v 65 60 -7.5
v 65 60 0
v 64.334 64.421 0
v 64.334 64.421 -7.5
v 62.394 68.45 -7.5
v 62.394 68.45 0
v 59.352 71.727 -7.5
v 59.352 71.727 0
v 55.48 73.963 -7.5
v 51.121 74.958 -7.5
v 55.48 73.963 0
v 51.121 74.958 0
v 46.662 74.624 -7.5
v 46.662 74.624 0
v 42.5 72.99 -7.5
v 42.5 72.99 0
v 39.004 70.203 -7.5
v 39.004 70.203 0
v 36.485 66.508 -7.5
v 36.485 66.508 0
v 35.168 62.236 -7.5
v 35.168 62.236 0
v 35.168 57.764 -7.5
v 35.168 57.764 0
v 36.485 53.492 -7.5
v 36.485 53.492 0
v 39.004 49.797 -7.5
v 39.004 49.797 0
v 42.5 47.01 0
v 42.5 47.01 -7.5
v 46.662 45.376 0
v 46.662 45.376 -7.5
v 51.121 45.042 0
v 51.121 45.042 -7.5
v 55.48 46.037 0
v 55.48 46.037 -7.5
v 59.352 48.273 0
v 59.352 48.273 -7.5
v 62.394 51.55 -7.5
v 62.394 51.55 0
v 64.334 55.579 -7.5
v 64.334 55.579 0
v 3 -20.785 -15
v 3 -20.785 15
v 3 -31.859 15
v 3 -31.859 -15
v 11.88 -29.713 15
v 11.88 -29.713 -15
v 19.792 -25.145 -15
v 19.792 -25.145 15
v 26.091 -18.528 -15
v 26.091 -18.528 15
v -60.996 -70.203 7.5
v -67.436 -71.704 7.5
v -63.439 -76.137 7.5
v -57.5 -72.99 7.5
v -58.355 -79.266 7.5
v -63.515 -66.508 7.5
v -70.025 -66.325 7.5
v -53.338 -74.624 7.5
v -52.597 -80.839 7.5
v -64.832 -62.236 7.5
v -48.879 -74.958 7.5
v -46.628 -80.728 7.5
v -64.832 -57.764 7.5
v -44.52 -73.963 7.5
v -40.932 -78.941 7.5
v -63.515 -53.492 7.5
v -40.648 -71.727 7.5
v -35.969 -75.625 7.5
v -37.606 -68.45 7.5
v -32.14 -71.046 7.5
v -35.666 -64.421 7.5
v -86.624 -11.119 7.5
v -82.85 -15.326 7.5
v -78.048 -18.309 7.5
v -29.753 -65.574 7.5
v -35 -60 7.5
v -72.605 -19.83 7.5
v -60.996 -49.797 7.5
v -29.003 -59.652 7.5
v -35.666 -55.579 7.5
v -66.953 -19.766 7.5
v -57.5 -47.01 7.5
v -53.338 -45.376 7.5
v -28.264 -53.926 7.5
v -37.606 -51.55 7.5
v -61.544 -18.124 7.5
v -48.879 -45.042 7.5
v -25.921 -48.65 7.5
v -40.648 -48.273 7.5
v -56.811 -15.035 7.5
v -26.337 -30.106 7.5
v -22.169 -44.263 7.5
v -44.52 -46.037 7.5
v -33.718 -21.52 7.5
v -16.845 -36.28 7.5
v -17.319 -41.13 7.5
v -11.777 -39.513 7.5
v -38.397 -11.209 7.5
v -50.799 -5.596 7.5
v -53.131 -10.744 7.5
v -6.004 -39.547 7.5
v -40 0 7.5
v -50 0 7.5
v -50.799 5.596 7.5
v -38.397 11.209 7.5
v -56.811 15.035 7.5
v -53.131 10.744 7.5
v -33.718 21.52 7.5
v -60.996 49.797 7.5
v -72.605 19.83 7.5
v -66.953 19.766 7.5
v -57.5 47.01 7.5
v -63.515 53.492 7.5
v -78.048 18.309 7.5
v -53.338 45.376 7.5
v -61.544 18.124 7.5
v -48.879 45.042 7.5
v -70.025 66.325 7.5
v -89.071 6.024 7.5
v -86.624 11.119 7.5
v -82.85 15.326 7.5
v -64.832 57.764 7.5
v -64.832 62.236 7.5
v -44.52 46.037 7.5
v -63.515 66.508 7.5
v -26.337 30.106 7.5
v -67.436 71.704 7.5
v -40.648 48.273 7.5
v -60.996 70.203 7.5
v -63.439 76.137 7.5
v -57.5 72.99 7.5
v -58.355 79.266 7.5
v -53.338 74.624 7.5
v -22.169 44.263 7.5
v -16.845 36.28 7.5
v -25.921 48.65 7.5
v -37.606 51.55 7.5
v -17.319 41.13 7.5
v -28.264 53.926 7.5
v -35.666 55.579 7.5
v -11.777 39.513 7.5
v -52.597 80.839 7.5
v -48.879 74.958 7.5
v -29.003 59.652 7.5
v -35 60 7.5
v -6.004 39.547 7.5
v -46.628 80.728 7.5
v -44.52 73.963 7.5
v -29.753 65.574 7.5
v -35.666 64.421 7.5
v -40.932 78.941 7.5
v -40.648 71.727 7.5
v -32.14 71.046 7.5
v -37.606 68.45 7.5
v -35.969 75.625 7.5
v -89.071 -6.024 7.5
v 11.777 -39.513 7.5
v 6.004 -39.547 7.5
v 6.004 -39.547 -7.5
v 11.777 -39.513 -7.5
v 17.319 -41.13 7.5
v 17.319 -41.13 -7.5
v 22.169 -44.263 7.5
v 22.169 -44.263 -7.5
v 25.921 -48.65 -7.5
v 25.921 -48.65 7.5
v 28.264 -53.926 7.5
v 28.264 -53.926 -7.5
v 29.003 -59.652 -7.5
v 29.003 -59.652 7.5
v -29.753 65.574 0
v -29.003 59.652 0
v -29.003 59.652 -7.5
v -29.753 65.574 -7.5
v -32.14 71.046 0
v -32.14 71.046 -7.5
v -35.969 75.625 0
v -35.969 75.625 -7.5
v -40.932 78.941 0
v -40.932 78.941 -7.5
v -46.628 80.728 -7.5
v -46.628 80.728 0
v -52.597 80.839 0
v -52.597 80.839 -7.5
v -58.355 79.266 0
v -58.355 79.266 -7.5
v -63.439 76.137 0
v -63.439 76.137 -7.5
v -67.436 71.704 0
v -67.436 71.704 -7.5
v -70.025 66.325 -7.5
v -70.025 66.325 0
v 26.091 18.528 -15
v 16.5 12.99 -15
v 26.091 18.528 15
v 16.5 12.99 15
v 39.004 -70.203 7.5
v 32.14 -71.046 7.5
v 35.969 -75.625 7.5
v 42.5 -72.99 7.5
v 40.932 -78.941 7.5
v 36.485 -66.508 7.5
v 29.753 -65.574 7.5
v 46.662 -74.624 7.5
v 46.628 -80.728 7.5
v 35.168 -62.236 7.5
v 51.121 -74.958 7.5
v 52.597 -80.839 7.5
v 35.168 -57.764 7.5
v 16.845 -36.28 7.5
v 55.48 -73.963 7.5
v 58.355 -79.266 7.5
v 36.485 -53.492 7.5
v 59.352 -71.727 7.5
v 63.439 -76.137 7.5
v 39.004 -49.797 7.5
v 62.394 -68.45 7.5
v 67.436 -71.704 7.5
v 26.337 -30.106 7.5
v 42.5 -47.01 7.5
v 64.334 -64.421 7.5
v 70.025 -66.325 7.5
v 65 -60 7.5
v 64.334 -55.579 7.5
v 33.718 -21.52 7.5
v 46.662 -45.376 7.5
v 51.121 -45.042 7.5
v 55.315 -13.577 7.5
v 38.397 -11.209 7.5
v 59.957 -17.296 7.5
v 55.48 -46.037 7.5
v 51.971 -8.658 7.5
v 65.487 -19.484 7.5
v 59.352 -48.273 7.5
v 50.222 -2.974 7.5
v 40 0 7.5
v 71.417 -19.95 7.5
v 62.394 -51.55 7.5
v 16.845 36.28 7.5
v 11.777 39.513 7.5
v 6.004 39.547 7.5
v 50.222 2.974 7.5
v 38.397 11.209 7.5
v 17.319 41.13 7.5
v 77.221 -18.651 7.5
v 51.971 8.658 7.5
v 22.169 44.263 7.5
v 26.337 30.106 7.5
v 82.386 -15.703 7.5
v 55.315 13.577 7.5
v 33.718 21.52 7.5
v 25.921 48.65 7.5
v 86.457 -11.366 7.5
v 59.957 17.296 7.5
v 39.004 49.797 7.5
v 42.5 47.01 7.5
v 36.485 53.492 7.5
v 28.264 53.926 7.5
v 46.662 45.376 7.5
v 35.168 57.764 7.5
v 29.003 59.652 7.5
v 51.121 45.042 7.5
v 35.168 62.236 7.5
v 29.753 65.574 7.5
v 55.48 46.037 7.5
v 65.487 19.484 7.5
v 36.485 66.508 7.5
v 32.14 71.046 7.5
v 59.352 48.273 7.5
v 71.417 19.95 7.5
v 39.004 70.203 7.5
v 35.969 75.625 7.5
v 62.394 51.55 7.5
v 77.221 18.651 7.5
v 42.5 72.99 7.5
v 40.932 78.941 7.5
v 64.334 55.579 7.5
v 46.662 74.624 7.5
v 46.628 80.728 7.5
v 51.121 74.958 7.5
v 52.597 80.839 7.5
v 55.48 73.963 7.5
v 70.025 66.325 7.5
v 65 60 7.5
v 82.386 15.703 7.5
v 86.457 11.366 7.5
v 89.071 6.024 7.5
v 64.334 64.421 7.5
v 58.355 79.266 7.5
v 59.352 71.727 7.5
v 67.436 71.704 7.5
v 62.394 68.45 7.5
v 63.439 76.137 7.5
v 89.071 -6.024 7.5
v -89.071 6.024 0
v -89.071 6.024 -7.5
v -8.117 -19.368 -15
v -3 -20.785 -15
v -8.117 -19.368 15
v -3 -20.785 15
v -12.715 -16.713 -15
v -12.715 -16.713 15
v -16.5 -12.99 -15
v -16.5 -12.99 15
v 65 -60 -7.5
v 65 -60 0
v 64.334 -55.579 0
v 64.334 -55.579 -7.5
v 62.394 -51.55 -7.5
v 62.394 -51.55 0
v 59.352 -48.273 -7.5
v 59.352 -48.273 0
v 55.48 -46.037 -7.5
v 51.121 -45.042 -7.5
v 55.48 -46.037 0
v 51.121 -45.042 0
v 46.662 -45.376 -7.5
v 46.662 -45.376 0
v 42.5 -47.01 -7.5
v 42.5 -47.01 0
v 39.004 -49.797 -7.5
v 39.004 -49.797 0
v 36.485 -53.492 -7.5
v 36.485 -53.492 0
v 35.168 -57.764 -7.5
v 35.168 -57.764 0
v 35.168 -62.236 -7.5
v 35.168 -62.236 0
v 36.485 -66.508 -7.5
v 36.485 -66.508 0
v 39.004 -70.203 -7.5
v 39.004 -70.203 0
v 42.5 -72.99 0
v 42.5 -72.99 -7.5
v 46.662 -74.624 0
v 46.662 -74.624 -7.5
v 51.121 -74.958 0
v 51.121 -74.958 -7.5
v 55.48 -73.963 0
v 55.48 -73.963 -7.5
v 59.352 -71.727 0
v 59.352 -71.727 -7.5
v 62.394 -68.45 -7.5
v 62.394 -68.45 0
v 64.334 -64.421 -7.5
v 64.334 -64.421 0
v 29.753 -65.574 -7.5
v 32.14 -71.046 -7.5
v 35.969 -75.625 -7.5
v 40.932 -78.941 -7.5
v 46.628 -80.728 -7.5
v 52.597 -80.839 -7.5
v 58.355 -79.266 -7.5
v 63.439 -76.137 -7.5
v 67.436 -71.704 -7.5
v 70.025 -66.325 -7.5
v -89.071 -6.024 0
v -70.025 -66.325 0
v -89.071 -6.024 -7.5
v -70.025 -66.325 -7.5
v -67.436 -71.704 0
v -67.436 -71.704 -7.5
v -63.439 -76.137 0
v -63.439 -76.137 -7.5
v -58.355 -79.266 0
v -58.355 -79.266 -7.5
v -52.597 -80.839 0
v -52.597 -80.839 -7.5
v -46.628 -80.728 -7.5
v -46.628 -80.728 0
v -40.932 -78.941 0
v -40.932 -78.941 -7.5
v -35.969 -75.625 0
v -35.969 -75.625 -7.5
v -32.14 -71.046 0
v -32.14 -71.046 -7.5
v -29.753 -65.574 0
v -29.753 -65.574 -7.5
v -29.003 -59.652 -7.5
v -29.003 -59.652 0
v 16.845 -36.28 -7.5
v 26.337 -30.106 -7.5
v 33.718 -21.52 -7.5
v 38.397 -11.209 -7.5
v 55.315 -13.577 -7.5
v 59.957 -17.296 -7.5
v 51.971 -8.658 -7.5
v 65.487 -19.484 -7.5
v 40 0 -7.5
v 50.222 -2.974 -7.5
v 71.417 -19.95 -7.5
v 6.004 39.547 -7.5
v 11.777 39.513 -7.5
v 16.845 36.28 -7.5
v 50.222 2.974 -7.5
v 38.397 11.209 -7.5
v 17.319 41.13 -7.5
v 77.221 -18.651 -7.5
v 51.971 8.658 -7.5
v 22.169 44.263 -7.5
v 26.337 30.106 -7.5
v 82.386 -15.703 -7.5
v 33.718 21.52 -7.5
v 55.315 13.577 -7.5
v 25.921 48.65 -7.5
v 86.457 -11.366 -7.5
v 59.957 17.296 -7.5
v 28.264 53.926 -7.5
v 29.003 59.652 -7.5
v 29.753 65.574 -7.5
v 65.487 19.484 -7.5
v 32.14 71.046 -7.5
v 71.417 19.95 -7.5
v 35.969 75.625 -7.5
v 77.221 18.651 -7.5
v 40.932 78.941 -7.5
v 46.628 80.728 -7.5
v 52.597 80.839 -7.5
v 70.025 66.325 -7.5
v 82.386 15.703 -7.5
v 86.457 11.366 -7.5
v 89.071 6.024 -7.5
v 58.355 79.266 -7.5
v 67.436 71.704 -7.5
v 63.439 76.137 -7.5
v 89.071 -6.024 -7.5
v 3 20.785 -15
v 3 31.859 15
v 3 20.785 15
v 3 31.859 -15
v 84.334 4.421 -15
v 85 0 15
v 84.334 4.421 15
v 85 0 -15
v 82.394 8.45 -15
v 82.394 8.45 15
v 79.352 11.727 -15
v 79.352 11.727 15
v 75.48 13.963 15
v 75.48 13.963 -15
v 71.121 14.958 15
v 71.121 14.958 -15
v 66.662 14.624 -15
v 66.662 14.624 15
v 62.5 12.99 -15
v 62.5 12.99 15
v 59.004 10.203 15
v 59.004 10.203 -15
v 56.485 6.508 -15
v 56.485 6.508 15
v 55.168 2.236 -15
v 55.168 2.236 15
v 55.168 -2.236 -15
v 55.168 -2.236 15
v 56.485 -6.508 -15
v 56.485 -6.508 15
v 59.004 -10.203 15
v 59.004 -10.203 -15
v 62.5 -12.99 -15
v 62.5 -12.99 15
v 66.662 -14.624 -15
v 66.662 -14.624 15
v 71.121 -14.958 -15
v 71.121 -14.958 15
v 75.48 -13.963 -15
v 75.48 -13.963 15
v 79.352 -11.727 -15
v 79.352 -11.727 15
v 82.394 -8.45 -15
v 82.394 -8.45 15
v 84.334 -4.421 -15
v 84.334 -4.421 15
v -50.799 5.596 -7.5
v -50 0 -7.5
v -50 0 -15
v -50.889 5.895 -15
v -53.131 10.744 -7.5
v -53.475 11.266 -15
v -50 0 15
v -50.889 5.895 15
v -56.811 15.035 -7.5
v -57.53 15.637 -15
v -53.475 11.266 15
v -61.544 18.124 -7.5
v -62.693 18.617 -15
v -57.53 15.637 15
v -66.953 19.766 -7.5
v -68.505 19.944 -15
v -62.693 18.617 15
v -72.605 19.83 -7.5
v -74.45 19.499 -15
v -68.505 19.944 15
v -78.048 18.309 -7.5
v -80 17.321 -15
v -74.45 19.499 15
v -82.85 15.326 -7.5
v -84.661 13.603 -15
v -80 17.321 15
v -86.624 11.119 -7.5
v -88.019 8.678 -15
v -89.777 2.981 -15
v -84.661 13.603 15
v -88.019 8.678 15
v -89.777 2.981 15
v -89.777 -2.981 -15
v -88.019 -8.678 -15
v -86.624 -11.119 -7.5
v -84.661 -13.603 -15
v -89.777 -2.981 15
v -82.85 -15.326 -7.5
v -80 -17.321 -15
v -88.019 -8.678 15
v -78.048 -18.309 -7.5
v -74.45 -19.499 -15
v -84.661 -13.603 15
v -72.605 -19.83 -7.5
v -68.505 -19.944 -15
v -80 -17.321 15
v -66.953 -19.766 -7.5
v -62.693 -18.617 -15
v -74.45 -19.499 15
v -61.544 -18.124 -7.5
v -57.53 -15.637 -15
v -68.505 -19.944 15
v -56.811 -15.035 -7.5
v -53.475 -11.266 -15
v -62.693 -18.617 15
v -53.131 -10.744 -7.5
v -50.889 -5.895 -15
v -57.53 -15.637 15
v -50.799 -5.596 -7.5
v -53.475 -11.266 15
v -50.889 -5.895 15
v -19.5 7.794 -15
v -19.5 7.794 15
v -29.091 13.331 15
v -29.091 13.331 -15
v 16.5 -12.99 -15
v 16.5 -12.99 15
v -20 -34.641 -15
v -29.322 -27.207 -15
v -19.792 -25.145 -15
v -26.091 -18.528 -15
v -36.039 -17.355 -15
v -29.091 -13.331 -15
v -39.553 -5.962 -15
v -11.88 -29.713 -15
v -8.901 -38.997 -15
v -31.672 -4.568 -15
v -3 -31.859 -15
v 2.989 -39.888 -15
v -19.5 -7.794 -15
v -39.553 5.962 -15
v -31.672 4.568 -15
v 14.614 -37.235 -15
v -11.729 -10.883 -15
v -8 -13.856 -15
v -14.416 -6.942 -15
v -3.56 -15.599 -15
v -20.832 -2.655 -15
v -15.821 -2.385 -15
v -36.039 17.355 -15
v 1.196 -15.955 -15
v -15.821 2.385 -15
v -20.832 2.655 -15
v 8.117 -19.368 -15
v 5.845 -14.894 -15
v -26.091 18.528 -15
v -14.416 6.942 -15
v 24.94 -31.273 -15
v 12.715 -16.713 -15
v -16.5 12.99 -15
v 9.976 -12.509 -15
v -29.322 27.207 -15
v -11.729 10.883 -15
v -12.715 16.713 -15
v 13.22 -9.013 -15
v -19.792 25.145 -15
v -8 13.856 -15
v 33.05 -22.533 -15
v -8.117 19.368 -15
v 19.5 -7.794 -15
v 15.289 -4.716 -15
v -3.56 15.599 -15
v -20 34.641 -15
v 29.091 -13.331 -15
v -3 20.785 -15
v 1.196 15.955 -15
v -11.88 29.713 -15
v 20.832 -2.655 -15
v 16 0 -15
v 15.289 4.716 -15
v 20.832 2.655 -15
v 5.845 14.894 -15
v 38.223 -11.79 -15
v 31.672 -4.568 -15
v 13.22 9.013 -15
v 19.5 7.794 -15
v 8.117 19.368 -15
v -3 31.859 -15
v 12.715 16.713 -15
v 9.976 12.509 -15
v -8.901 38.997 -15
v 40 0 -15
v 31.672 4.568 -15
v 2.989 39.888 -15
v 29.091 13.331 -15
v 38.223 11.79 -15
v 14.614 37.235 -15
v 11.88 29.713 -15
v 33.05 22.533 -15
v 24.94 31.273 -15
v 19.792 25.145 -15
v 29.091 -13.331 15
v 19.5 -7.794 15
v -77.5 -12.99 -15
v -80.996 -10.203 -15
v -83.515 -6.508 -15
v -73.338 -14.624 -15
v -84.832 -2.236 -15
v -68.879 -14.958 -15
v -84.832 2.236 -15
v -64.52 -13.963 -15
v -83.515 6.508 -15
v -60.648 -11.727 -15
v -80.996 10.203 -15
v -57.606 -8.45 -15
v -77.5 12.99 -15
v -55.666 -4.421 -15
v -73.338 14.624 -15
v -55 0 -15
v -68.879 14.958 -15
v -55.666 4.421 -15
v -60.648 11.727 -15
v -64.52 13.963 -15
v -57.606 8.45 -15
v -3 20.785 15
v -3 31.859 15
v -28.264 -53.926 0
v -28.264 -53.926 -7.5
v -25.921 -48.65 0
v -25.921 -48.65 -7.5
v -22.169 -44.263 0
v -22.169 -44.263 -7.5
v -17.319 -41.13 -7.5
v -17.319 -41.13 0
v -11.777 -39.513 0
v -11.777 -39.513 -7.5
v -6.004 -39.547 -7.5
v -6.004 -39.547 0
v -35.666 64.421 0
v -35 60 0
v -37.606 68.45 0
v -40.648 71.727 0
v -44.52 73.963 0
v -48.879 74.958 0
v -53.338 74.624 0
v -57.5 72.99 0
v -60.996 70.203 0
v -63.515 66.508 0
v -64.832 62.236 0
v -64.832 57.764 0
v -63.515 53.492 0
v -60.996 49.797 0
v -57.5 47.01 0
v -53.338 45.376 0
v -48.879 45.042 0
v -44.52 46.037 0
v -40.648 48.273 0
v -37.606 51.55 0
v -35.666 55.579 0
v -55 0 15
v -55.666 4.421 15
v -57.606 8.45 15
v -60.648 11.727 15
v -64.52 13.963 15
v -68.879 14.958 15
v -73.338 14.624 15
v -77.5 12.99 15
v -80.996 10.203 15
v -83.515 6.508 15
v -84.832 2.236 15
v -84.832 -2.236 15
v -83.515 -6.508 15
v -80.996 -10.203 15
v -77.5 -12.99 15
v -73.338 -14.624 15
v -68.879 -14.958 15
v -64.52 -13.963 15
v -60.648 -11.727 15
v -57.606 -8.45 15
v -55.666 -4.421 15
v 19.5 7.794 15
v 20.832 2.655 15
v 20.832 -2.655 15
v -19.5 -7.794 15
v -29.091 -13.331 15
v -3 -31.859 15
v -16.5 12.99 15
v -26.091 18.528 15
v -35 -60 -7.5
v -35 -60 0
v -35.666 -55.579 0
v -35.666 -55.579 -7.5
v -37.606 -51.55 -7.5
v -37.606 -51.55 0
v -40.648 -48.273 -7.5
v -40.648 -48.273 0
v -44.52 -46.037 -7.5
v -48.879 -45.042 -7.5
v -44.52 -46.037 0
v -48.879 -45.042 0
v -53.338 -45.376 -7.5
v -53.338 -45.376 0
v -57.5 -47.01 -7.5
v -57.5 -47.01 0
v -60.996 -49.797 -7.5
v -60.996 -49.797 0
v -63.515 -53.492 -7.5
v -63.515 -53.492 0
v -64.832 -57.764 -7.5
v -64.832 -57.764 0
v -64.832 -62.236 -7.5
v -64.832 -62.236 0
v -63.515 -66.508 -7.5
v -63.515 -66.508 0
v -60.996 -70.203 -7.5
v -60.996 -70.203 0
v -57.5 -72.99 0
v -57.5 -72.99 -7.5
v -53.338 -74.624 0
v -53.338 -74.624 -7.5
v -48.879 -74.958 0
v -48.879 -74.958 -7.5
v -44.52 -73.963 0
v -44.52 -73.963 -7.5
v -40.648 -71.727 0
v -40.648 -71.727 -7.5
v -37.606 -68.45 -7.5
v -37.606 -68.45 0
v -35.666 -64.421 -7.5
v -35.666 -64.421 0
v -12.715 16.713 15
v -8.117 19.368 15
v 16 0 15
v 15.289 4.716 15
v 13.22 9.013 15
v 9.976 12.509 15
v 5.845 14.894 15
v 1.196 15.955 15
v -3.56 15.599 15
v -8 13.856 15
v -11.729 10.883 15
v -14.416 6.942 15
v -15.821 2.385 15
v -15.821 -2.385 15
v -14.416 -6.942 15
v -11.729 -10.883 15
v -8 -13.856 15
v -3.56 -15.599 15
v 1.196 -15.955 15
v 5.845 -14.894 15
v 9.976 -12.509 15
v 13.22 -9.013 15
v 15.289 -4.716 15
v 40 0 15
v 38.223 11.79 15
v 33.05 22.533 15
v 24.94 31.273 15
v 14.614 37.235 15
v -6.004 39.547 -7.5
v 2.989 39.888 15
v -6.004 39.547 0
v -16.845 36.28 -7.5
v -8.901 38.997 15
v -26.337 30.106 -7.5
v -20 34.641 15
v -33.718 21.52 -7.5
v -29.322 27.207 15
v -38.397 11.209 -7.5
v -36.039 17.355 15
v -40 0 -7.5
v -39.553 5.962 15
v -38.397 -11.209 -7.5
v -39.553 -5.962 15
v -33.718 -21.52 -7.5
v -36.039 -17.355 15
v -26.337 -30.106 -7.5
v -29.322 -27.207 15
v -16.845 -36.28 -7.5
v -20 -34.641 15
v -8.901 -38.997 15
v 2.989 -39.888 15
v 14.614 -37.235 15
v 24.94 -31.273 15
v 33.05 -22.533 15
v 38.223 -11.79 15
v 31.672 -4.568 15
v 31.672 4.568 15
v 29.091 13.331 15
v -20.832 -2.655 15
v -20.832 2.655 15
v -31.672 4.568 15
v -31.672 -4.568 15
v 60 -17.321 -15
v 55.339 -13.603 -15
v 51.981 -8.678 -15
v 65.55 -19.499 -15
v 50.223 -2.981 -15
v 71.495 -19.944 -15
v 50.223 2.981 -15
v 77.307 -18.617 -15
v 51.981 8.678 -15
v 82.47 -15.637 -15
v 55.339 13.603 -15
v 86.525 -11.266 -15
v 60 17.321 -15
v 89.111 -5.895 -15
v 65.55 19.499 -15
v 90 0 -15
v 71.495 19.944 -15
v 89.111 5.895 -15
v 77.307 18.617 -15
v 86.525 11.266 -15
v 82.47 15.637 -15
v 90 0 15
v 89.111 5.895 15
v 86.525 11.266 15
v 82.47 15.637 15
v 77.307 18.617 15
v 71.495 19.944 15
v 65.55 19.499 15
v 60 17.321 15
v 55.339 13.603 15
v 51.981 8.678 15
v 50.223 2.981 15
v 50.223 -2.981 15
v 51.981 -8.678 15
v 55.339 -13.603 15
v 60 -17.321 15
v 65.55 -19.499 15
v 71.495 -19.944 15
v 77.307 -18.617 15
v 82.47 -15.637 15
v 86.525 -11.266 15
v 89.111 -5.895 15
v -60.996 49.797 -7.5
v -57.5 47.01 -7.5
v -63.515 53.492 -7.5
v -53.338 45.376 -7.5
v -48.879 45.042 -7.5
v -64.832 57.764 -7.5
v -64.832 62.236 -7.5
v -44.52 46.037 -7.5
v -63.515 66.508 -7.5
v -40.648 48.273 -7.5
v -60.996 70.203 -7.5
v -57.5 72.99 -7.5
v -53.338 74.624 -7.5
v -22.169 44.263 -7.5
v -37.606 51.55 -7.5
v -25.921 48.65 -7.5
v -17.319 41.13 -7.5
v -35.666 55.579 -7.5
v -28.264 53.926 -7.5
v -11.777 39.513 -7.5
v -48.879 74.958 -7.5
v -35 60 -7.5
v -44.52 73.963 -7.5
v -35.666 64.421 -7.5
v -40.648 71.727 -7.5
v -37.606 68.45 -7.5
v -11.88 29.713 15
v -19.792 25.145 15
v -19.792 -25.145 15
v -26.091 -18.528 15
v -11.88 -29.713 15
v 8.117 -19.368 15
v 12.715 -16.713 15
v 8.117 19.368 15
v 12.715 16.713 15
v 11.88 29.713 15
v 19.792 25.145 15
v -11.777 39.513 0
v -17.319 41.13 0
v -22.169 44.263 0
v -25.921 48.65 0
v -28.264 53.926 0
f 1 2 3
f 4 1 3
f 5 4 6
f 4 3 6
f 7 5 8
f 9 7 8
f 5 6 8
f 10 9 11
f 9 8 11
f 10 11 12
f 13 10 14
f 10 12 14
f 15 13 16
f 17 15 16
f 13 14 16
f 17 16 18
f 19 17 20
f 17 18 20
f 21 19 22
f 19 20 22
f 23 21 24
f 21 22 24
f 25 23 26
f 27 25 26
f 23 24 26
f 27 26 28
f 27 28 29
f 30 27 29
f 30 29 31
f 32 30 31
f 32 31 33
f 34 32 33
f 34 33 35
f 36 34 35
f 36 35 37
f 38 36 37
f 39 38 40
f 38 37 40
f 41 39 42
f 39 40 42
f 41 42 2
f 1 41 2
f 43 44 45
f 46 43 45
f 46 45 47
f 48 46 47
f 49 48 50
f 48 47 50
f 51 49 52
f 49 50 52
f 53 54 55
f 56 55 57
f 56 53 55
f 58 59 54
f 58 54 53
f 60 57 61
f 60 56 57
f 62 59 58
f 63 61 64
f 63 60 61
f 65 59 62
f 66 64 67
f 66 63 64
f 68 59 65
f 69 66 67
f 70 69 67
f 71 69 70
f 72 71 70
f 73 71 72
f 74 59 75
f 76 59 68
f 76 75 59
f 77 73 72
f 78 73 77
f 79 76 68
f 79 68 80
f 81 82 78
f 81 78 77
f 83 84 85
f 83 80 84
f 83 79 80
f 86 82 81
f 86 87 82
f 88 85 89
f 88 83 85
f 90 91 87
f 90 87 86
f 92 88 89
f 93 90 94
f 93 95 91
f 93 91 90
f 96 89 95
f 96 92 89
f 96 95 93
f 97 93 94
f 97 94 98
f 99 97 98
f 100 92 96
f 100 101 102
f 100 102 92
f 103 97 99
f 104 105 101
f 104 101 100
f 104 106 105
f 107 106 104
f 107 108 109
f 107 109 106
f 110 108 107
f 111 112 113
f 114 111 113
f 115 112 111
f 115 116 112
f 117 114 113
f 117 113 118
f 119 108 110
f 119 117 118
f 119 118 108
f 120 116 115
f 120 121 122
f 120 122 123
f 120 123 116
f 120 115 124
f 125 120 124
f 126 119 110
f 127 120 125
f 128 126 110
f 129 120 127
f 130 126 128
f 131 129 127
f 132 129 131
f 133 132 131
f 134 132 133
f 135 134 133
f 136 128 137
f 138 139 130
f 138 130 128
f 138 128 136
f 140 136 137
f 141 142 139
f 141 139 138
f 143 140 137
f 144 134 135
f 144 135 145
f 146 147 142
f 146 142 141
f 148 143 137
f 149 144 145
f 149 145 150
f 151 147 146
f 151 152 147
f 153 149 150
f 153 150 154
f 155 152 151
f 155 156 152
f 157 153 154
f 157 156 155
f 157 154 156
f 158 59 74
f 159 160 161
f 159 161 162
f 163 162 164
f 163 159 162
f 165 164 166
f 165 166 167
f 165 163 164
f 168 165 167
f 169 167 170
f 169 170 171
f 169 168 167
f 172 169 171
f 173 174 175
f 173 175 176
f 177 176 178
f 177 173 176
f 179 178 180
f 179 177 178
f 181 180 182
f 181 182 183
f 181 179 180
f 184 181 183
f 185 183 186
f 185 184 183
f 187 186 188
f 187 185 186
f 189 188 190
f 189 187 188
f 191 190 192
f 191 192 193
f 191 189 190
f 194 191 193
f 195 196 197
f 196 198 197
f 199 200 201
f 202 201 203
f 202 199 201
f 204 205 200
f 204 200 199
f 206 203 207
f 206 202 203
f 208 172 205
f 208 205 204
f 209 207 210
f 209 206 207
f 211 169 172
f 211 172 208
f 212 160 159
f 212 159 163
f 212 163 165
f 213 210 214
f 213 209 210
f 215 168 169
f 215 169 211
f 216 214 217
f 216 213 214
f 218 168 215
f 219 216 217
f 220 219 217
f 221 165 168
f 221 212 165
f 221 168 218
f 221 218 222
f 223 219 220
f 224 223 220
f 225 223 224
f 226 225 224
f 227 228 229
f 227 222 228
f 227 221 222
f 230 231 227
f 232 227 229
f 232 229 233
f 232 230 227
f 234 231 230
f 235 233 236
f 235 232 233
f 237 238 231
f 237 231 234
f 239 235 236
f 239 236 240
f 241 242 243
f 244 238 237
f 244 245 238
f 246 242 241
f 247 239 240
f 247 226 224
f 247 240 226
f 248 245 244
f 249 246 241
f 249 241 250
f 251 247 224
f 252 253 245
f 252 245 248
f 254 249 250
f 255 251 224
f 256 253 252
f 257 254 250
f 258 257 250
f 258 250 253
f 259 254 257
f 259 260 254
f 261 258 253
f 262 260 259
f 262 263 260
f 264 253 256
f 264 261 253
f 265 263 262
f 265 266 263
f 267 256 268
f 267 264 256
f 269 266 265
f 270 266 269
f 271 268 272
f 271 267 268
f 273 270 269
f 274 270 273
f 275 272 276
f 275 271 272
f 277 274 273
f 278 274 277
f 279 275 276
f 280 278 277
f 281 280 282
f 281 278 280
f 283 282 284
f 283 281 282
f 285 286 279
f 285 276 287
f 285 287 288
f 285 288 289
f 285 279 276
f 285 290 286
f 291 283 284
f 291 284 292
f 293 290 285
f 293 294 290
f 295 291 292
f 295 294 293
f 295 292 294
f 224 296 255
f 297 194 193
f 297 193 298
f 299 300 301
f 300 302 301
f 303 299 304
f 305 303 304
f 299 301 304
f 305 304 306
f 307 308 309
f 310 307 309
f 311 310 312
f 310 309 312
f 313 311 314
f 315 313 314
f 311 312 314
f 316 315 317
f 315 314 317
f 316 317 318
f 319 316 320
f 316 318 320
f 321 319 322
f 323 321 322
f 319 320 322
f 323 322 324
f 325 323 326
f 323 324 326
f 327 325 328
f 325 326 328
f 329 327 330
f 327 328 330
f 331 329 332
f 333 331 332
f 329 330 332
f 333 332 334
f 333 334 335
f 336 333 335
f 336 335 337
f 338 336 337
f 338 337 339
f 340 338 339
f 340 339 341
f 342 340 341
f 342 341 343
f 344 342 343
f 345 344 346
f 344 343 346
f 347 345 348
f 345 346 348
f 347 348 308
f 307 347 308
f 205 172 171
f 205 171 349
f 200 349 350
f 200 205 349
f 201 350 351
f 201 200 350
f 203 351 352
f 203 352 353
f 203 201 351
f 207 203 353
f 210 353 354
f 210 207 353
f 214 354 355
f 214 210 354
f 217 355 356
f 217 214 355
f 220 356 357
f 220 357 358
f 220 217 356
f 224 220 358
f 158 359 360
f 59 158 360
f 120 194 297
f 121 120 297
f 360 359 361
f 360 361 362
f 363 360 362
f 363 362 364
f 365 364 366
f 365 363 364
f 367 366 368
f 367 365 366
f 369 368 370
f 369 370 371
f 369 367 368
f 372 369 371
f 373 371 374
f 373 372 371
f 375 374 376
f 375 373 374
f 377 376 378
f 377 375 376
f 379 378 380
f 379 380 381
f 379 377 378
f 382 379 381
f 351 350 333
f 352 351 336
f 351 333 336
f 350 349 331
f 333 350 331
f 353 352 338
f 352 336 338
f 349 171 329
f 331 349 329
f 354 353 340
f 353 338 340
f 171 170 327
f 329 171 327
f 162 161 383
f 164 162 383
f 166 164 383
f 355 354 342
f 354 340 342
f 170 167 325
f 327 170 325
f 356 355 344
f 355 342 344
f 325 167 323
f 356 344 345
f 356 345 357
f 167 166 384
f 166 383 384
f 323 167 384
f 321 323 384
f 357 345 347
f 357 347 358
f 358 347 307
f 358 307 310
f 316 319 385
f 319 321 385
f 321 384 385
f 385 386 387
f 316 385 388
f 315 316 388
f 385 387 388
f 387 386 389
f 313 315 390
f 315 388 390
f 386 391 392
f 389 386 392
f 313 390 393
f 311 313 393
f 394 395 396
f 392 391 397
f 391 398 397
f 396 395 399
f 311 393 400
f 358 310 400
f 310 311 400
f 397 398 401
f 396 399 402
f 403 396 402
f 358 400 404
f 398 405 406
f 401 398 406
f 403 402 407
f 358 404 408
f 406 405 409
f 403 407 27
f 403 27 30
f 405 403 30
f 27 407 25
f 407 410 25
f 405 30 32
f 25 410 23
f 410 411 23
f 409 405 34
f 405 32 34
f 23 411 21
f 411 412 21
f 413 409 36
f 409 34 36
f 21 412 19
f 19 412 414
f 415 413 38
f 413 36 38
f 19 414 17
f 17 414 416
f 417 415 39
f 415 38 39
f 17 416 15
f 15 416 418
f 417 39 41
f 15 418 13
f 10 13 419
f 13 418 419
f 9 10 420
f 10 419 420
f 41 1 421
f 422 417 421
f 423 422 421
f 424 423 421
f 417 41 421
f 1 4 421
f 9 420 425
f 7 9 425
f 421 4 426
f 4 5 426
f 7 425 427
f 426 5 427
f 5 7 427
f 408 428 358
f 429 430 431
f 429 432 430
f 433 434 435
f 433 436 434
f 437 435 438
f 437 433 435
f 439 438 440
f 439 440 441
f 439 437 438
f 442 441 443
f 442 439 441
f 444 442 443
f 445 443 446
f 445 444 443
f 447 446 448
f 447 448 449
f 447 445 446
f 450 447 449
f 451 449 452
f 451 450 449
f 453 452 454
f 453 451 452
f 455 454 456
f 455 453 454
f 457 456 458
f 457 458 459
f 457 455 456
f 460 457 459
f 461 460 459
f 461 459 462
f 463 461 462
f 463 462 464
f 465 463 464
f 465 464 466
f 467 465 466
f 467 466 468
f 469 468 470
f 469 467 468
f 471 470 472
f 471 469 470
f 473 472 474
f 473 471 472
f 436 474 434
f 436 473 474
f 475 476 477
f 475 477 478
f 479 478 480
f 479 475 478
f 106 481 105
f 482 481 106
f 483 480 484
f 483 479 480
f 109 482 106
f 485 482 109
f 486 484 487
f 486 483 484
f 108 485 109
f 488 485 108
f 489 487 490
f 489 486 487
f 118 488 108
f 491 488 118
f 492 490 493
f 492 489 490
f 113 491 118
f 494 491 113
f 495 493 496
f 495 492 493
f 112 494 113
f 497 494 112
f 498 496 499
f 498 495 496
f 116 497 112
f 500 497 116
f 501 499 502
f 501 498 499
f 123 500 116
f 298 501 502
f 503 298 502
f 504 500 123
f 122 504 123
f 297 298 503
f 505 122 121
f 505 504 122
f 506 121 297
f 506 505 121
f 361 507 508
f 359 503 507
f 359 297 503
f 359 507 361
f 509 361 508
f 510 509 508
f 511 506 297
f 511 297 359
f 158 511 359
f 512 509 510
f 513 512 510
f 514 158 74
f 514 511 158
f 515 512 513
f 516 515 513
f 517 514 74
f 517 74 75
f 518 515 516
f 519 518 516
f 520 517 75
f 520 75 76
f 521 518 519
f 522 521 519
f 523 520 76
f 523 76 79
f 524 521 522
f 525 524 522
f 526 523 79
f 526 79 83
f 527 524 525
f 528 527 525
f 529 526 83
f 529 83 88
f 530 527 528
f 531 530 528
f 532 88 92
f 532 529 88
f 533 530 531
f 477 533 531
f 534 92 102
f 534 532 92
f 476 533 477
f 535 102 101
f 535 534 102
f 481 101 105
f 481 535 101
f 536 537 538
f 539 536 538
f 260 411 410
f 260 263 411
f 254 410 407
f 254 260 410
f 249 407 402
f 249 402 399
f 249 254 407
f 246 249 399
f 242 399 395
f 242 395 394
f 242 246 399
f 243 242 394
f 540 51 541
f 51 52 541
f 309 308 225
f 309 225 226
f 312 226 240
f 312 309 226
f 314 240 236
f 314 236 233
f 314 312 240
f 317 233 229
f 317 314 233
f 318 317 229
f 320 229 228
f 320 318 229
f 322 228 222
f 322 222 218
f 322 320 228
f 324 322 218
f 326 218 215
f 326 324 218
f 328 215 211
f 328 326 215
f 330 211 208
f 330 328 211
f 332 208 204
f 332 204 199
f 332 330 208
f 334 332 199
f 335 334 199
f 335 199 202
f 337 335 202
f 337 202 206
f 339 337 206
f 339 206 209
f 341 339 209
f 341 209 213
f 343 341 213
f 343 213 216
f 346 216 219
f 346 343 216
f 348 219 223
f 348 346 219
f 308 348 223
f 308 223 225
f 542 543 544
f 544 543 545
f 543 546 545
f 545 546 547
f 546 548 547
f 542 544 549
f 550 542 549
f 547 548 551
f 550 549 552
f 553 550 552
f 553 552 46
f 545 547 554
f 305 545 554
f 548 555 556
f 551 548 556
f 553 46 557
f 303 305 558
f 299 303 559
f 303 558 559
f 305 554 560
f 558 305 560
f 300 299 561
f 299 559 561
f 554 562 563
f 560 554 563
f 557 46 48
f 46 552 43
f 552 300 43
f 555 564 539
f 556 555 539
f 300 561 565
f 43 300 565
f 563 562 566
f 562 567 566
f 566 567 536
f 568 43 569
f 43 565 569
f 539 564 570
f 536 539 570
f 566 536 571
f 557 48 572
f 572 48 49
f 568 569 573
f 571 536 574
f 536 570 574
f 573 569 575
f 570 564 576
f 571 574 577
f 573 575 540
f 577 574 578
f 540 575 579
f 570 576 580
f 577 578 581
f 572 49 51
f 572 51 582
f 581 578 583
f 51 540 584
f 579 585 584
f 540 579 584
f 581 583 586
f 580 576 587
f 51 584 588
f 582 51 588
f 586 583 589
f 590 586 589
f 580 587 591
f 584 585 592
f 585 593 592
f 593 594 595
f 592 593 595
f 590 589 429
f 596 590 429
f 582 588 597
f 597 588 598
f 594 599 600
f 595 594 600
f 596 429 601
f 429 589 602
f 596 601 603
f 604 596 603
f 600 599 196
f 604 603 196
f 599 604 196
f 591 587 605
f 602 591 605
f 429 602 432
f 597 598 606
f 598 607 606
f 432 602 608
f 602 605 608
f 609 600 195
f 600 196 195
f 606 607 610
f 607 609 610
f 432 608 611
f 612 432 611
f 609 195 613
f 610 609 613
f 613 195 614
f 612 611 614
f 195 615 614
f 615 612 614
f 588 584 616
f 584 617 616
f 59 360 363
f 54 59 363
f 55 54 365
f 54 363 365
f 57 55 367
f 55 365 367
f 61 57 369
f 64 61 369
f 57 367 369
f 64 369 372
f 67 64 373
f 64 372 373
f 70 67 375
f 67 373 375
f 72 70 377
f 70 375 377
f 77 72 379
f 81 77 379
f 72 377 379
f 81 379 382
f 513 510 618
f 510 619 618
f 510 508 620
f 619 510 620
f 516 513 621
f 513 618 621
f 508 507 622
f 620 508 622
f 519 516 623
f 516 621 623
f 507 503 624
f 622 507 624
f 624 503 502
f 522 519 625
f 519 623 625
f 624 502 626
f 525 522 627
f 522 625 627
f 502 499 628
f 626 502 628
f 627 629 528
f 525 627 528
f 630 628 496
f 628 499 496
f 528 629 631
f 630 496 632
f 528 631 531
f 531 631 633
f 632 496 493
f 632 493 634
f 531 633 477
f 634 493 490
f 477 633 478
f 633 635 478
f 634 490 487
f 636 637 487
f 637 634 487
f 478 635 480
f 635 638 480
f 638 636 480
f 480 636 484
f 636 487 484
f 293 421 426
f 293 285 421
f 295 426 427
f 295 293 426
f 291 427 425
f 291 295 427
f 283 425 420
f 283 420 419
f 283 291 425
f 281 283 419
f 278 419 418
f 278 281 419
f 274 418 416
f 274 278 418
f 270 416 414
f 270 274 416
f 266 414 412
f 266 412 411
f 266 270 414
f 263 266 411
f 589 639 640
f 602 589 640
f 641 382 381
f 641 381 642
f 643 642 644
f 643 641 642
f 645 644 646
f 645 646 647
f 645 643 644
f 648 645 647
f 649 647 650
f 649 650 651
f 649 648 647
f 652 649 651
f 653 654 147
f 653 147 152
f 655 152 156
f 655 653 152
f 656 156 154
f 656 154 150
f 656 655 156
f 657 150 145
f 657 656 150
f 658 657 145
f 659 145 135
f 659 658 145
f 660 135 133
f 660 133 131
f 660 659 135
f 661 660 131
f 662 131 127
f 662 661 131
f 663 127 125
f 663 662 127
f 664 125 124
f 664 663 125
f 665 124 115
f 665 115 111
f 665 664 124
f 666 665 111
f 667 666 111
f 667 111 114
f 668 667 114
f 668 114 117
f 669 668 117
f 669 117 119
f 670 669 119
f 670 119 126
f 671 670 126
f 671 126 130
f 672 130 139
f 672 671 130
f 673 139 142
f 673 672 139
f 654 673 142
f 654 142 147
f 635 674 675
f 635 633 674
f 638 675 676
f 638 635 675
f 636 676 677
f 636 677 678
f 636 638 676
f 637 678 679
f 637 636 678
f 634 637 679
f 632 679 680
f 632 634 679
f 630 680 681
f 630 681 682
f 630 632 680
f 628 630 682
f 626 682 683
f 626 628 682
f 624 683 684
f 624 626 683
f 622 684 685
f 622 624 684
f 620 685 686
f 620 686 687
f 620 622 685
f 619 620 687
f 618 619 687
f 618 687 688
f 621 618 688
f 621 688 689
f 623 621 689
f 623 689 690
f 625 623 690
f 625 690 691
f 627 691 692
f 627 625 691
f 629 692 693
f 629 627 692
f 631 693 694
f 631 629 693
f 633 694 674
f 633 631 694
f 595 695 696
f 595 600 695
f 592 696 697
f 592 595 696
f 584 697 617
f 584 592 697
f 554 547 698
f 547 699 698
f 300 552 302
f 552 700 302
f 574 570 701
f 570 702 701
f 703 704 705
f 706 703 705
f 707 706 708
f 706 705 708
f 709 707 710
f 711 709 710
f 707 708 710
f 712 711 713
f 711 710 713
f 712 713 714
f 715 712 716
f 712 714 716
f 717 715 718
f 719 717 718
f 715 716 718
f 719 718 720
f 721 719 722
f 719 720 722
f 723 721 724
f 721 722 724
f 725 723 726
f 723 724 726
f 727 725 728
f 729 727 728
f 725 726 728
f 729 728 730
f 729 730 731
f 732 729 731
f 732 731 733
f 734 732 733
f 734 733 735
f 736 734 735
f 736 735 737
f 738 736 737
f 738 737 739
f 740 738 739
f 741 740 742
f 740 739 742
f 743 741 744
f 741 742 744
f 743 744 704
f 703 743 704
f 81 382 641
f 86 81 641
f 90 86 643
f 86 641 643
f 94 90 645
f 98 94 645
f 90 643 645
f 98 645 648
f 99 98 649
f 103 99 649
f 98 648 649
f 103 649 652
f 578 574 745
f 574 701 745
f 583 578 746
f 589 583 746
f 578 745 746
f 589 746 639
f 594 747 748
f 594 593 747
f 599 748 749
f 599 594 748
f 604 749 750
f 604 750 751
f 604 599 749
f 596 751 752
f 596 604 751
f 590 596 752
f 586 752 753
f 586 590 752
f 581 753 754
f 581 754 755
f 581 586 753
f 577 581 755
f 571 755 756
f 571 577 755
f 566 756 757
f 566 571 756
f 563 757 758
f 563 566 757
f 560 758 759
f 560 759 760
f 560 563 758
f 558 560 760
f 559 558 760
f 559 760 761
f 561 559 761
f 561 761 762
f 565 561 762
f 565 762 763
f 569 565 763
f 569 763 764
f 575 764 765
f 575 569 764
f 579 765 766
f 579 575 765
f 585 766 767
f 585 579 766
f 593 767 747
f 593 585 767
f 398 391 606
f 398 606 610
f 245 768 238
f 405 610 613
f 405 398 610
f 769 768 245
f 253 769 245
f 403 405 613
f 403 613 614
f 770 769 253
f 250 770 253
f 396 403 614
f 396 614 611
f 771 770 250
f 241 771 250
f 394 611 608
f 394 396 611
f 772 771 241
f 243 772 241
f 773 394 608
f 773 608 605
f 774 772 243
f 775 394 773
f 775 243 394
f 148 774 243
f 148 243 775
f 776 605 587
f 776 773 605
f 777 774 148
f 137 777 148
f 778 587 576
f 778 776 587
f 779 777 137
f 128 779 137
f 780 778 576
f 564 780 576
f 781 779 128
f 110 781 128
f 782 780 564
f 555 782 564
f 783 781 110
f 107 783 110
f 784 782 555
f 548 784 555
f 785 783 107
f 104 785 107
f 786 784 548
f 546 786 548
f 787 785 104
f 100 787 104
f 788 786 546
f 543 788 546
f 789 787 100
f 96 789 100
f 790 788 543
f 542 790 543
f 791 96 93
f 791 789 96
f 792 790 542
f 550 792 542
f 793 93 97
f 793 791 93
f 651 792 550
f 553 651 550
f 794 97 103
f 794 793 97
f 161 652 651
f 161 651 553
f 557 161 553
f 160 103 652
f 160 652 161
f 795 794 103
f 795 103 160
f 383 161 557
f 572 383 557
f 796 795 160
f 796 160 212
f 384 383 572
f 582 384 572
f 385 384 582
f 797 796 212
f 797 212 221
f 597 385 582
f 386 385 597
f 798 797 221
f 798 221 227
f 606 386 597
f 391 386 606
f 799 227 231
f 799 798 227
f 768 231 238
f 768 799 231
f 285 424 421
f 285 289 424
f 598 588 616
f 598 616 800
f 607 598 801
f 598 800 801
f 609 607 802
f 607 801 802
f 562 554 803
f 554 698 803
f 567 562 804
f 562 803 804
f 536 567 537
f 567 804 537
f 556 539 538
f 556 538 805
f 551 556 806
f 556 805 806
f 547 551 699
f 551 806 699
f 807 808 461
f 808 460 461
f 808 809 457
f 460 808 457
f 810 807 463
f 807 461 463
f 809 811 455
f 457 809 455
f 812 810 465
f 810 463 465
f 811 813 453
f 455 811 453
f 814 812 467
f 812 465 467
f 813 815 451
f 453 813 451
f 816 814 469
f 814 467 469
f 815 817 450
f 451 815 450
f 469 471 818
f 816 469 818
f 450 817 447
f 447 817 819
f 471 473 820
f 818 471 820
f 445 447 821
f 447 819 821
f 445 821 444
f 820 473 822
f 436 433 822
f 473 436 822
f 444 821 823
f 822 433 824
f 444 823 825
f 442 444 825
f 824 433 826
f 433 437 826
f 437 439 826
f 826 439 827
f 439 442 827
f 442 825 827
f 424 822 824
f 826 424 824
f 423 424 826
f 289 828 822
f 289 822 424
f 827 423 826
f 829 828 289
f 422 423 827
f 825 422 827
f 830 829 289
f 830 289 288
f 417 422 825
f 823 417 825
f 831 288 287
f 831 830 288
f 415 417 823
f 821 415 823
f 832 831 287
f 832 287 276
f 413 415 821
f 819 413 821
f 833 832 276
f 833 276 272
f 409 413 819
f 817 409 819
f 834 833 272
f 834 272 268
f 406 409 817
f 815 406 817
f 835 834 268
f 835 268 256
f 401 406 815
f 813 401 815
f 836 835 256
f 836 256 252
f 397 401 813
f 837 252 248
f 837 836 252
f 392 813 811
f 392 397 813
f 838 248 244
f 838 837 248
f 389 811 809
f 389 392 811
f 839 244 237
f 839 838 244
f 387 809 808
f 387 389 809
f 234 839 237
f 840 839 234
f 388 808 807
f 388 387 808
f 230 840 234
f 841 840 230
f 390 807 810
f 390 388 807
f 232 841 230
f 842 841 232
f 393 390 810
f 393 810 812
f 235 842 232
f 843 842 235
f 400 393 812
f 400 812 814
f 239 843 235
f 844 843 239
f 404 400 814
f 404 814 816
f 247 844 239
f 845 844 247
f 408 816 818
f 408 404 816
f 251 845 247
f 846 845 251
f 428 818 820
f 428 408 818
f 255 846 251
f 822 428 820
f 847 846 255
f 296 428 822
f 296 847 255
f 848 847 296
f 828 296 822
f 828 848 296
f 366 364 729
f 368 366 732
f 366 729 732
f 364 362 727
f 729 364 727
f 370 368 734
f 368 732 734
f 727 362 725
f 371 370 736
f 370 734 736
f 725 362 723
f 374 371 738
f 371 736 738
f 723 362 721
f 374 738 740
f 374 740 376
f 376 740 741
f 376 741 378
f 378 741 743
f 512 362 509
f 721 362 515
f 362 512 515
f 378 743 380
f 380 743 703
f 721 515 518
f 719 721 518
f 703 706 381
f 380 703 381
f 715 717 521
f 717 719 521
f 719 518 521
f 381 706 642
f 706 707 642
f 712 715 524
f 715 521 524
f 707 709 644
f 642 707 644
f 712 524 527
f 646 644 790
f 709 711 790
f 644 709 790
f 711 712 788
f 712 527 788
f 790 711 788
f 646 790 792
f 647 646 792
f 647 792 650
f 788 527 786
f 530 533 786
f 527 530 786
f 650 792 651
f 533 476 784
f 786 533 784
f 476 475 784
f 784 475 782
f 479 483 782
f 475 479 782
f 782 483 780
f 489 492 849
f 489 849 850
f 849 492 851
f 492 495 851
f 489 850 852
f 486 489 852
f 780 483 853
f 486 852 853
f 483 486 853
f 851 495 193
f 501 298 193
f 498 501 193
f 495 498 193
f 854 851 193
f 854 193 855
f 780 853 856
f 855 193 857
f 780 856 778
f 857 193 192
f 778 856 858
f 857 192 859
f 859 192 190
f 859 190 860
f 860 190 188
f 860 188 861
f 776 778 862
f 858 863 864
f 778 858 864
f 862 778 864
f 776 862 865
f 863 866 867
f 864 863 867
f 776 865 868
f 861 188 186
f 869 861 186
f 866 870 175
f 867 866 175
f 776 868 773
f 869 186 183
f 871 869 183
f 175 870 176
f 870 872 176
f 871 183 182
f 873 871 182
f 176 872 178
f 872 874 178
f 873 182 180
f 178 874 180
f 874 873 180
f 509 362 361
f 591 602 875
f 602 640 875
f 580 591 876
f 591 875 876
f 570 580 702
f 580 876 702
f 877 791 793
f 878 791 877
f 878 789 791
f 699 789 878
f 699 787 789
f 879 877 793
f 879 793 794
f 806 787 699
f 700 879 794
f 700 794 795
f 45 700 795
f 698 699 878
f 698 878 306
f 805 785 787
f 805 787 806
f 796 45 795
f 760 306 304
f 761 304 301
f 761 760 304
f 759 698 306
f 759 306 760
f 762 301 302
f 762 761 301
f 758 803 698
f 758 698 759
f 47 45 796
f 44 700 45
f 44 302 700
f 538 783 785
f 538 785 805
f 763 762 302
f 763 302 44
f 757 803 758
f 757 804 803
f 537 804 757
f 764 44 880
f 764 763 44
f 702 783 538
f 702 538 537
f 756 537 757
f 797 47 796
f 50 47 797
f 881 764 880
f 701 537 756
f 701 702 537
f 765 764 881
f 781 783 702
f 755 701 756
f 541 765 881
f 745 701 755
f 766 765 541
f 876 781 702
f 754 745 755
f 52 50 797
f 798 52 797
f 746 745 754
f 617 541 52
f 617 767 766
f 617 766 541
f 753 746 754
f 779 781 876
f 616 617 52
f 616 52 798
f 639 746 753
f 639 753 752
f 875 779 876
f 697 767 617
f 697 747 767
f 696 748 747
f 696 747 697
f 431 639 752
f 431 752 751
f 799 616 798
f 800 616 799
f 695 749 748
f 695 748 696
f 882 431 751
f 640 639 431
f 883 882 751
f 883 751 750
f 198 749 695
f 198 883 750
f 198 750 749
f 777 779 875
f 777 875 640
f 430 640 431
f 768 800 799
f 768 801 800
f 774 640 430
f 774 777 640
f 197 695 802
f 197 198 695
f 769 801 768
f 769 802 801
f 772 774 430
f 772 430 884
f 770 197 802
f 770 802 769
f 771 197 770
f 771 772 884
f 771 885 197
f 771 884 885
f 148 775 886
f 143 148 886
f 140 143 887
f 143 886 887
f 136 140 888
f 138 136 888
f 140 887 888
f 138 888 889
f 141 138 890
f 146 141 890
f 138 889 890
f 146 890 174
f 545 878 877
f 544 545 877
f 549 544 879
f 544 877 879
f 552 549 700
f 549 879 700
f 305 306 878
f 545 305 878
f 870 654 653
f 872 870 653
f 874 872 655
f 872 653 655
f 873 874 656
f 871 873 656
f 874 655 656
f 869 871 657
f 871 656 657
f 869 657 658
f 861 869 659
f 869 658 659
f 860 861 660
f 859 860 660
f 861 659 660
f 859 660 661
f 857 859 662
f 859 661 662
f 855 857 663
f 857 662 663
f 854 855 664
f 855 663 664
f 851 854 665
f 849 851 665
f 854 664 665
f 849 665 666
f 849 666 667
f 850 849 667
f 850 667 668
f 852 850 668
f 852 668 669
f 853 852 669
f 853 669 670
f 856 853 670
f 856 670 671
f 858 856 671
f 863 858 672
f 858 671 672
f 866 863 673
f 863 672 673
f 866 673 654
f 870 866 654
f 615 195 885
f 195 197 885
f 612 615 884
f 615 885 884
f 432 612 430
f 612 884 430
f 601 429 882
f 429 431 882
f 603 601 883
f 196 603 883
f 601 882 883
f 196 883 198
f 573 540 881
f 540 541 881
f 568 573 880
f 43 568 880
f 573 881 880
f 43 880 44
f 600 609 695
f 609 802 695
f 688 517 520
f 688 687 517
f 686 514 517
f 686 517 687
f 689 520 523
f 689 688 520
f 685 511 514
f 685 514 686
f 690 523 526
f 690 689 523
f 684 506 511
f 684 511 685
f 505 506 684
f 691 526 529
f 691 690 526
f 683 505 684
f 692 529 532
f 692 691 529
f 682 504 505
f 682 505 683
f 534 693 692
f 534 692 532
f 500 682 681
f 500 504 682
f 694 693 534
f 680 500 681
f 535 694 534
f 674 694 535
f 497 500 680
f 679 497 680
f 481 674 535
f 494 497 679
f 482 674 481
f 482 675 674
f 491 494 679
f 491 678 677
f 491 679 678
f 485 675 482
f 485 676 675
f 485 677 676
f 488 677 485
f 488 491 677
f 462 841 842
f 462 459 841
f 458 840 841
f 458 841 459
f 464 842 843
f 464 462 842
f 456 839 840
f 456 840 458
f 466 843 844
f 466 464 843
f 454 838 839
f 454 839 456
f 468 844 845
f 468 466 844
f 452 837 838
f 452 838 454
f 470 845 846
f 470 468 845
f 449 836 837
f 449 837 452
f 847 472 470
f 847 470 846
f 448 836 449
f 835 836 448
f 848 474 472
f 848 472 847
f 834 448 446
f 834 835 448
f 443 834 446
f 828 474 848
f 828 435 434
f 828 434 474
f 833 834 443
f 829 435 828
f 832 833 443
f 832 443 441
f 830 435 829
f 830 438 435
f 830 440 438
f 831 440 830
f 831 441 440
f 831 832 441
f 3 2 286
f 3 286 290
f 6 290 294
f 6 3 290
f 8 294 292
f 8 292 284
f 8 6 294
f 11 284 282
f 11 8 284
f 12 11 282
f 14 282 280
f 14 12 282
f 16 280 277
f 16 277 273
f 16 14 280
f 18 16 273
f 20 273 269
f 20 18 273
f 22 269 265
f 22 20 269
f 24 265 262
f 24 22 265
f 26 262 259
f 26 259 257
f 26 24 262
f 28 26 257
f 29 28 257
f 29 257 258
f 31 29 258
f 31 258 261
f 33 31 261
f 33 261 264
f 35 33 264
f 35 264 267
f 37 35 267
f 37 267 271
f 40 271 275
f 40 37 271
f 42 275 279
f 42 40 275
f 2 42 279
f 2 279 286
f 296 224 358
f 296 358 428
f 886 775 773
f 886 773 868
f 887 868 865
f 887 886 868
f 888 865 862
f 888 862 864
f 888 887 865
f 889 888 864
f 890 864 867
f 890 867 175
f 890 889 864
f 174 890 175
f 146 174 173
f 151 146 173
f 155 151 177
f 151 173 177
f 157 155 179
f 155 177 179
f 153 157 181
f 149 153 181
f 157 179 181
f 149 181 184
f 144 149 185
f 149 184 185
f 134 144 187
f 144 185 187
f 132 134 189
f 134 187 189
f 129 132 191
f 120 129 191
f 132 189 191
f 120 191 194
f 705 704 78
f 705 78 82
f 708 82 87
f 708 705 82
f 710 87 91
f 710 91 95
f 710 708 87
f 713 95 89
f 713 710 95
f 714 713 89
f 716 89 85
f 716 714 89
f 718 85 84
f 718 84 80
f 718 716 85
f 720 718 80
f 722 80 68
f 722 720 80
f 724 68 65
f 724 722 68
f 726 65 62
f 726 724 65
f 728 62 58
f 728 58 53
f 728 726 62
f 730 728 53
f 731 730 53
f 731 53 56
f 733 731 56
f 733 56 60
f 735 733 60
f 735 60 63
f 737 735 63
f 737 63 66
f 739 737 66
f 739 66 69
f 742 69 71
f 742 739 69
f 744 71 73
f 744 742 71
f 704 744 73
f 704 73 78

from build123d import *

# Parameters (mm, degrees)
SKETCH1_R             = 20
SKETCH1_R_2           = 15
BOSS_EXTRUDE1_DEPTH   = 15
SKETCH1_R_3           = 40
SKETCH1_R_4           = 16
BOSS_EXTRUDE1_2_DEPTH = 15
BOSS_EXTRUDE1_3_DEPTH = 15
SKETCH1_3_R           = 15
BOSS_EXTRUDE2_DEPTH   = 7.5


with BuildPart() as part:
    # Sketch1 → Boss-Extrude1 (new, symmetric)
    with BuildSketch(Plane.XY):
        with Locations((-70, 0)):
            Circle(SKETCH1_R)
        with Locations((-70, 0)):
            Circle(SKETCH1_R_2, mode=Mode.SUBTRACT)
    extrude(amount=BOSS_EXTRUDE1_DEPTH, both=True)



with BuildPart() as body_2:
    # Sketch1 → Boss-Extrude1 2 (new, symmetric)
    with BuildSketch(Plane.XY):
        Circle(SKETCH1_R_3)
        with BuildLine():
            ThreePointArc((-16.5, -12.990381057), (-10.5, -18.186533479), (-3, -20.784609691))
            Line((-3, -20.784609691), (-3, -31.859064644))
            ThreePointArc((-3, -31.859064644), (-16, -27.712812921), (-26.090759323, -18.527608533))
            Line((-26.090759323, -18.527608533), (-16.5, -12.990381057))
        make_face(mode=Mode.SUBTRACT)
        with BuildLine():
            Line((3, -31.859064644), (3, -20.784609691))
            ThreePointArc((3, -20.784609691), (10.5, -18.186533479), (16.5, -12.990381057))
            Line((16.5, -12.990381057), (26.090759323, -18.527608533))
            ThreePointArc((26.090759323, -18.527608533), (16, -27.712812921), (3, -31.859064644))
        make_face(mode=Mode.SUBTRACT)
        with BuildLine():
            ThreePointArc((19.5, -7.794228634), (21, 0), (19.5, 7.794228634))
            Line((19.5, 7.794228634), (29.090759323, 13.331456111))
            ThreePointArc((29.090759323, 13.331456111), (32, 0), (29.090759323, -13.331456111))
            Line((29.090759323, -13.331456111), (19.5, -7.794228634))
        make_face(mode=Mode.SUBTRACT)
        with BuildLine():
            ThreePointArc((-19.5, 7.794228634), (-21, 0), (-19.5, -7.794228634))
            Line((-19.5, -7.794228634), (-29.090759323, -13.331456111))
            ThreePointArc((-29.090759323, -13.331456111), (-32, 0), (-29.090759323, 13.331456111))
            Line((-29.090759323, 13.331456111), (-19.5, 7.794228634))
        make_face(mode=Mode.SUBTRACT)
        with BuildLine():
            ThreePointArc((-3, 20.784609691), (-10.5, 18.186533479), (-16.5, 12.990381057))
            Line((-16.5, 12.990381057), (-26.090759323, 18.527608533))
            ThreePointArc((-26.090759323, 18.527608533), (-16, 27.712812921), (-3, 31.859064644))
            Line((-3, 31.859064644), (-3, 20.784609691))
        make_face(mode=Mode.SUBTRACT)
        Circle(SKETCH1_R_4, mode=Mode.SUBTRACT)
        with BuildLine():
            ThreePointArc((16.5, 12.990381057), (10.5, 18.186533479), (3, 20.784609691))
            Line((3, 20.784609691), (3, 31.859064644))
            ThreePointArc((3, 31.859064644), (16, 27.712812921), (26.090759323, 18.527608533))
            Line((26.090759323, 18.527608533), (16.5, 12.990381057))
        make_face(mode=Mode.SUBTRACT)
    extrude(amount=BOSS_EXTRUDE1_2_DEPTH, both=True)


with BuildPart() as body_3:
    # Sketch1 → Boss-Extrude1 3 (new, symmetric)
    with BuildSketch(Plane.XY):
        with Locations((70, 0)):
            Circle(SKETCH1_R)
        with Locations((70, 0)):
            Circle(SKETCH1_R_2, mode=Mode.SUBTRACT)
    extrude(amount=BOSS_EXTRUDE1_3_DEPTH, both=True)


with BuildPart() as part_1:
    add(part.part)

    add(body_2.part)  # Boss-Extrude2 merges body 2

    add(body_3.part)  # Boss-Extrude2 merges body 3
    # Sketch1<3> → Boss-Extrude2 (add, symmetric)
    # profile 1 of 2: a face of its own
    with BuildSketch(Plane.XY):
        with BuildLine():
            ThreePointArc((-89.071294105, 6.023764702), (-50, 0), (-89.071294105, -6.023764702))
            Line((-89.071294105, -6.023764702), (-70.02485881, -66.324952937))
            ThreePointArc((-70.02485881, -66.324952937), (-46.6282273, -80.727545655), (-29.002885891, -59.651863383))
            ThreePointArc((-29.002885891, -59.651863383), (-22.168588856, -44.262528341), (-6.003756239, -39.546869801))
            ThreePointArc((-6.003756239, -39.546869801), (-40, 0), (-6.003756239, 39.546869801))
            ThreePointArc((-6.003756239, 39.546869801), (-22.168588856, 44.262528341), (-29.002885891, 59.651863383))
            ThreePointArc((-29.002885891, 59.651863383), (-46.6282273, 80.727545655), (-70.02485881, 66.324952937))
            Line((-70.02485881, 66.324952937), (-89.071294105, 6.023764702))
        make_face()
        with Locations((-50, -60)):
            Circle(SKETCH1_3_R, mode=Mode.SUBTRACT)
        with Locations((-50, 60)):
            Circle(SKETCH1_3_R, mode=Mode.SUBTRACT)
    # profile 2 of 2: a face of its own
    with BuildSketch(Plane.XY):
        with BuildLine():
            ThreePointArc((6.003756239, 39.546869801), (40, 0), (6.003756239, -39.546869801))
            ThreePointArc((6.003756239, -39.546869801), (22.168588856, -44.262528341), (29.002885891, -59.651863383))
            ThreePointArc((29.002885891, -59.651863383), (46.6282273, -80.727545655), (70.02485881, -66.324952937))
            Line((70.02485881, -66.324952937), (89.071294105, -6.023764702))
            ThreePointArc((89.071294105, -6.023764702), (50, 0), (89.071294105, 6.023764702))
            Line((89.071294105, 6.023764702), (70.02485881, 66.324952937))
            ThreePointArc((70.02485881, 66.324952937), (46.6282273, 80.727545655), (29.002885891, 59.651863383))
            ThreePointArc((29.002885891, 59.651863383), (22.168588856, 44.262528341), (6.003756239, 39.546869801))
        make_face()
        with Locations((50, -60)):
            Circle(SKETCH1_3_R, mode=Mode.SUBTRACT)
        with Locations((50, 60)):
            Circle(SKETCH1_3_R, mode=Mode.SUBTRACT)
    extrude(amount=BOSS_EXTRUDE2_DEPTH, both=True)


solid = part_1.part
